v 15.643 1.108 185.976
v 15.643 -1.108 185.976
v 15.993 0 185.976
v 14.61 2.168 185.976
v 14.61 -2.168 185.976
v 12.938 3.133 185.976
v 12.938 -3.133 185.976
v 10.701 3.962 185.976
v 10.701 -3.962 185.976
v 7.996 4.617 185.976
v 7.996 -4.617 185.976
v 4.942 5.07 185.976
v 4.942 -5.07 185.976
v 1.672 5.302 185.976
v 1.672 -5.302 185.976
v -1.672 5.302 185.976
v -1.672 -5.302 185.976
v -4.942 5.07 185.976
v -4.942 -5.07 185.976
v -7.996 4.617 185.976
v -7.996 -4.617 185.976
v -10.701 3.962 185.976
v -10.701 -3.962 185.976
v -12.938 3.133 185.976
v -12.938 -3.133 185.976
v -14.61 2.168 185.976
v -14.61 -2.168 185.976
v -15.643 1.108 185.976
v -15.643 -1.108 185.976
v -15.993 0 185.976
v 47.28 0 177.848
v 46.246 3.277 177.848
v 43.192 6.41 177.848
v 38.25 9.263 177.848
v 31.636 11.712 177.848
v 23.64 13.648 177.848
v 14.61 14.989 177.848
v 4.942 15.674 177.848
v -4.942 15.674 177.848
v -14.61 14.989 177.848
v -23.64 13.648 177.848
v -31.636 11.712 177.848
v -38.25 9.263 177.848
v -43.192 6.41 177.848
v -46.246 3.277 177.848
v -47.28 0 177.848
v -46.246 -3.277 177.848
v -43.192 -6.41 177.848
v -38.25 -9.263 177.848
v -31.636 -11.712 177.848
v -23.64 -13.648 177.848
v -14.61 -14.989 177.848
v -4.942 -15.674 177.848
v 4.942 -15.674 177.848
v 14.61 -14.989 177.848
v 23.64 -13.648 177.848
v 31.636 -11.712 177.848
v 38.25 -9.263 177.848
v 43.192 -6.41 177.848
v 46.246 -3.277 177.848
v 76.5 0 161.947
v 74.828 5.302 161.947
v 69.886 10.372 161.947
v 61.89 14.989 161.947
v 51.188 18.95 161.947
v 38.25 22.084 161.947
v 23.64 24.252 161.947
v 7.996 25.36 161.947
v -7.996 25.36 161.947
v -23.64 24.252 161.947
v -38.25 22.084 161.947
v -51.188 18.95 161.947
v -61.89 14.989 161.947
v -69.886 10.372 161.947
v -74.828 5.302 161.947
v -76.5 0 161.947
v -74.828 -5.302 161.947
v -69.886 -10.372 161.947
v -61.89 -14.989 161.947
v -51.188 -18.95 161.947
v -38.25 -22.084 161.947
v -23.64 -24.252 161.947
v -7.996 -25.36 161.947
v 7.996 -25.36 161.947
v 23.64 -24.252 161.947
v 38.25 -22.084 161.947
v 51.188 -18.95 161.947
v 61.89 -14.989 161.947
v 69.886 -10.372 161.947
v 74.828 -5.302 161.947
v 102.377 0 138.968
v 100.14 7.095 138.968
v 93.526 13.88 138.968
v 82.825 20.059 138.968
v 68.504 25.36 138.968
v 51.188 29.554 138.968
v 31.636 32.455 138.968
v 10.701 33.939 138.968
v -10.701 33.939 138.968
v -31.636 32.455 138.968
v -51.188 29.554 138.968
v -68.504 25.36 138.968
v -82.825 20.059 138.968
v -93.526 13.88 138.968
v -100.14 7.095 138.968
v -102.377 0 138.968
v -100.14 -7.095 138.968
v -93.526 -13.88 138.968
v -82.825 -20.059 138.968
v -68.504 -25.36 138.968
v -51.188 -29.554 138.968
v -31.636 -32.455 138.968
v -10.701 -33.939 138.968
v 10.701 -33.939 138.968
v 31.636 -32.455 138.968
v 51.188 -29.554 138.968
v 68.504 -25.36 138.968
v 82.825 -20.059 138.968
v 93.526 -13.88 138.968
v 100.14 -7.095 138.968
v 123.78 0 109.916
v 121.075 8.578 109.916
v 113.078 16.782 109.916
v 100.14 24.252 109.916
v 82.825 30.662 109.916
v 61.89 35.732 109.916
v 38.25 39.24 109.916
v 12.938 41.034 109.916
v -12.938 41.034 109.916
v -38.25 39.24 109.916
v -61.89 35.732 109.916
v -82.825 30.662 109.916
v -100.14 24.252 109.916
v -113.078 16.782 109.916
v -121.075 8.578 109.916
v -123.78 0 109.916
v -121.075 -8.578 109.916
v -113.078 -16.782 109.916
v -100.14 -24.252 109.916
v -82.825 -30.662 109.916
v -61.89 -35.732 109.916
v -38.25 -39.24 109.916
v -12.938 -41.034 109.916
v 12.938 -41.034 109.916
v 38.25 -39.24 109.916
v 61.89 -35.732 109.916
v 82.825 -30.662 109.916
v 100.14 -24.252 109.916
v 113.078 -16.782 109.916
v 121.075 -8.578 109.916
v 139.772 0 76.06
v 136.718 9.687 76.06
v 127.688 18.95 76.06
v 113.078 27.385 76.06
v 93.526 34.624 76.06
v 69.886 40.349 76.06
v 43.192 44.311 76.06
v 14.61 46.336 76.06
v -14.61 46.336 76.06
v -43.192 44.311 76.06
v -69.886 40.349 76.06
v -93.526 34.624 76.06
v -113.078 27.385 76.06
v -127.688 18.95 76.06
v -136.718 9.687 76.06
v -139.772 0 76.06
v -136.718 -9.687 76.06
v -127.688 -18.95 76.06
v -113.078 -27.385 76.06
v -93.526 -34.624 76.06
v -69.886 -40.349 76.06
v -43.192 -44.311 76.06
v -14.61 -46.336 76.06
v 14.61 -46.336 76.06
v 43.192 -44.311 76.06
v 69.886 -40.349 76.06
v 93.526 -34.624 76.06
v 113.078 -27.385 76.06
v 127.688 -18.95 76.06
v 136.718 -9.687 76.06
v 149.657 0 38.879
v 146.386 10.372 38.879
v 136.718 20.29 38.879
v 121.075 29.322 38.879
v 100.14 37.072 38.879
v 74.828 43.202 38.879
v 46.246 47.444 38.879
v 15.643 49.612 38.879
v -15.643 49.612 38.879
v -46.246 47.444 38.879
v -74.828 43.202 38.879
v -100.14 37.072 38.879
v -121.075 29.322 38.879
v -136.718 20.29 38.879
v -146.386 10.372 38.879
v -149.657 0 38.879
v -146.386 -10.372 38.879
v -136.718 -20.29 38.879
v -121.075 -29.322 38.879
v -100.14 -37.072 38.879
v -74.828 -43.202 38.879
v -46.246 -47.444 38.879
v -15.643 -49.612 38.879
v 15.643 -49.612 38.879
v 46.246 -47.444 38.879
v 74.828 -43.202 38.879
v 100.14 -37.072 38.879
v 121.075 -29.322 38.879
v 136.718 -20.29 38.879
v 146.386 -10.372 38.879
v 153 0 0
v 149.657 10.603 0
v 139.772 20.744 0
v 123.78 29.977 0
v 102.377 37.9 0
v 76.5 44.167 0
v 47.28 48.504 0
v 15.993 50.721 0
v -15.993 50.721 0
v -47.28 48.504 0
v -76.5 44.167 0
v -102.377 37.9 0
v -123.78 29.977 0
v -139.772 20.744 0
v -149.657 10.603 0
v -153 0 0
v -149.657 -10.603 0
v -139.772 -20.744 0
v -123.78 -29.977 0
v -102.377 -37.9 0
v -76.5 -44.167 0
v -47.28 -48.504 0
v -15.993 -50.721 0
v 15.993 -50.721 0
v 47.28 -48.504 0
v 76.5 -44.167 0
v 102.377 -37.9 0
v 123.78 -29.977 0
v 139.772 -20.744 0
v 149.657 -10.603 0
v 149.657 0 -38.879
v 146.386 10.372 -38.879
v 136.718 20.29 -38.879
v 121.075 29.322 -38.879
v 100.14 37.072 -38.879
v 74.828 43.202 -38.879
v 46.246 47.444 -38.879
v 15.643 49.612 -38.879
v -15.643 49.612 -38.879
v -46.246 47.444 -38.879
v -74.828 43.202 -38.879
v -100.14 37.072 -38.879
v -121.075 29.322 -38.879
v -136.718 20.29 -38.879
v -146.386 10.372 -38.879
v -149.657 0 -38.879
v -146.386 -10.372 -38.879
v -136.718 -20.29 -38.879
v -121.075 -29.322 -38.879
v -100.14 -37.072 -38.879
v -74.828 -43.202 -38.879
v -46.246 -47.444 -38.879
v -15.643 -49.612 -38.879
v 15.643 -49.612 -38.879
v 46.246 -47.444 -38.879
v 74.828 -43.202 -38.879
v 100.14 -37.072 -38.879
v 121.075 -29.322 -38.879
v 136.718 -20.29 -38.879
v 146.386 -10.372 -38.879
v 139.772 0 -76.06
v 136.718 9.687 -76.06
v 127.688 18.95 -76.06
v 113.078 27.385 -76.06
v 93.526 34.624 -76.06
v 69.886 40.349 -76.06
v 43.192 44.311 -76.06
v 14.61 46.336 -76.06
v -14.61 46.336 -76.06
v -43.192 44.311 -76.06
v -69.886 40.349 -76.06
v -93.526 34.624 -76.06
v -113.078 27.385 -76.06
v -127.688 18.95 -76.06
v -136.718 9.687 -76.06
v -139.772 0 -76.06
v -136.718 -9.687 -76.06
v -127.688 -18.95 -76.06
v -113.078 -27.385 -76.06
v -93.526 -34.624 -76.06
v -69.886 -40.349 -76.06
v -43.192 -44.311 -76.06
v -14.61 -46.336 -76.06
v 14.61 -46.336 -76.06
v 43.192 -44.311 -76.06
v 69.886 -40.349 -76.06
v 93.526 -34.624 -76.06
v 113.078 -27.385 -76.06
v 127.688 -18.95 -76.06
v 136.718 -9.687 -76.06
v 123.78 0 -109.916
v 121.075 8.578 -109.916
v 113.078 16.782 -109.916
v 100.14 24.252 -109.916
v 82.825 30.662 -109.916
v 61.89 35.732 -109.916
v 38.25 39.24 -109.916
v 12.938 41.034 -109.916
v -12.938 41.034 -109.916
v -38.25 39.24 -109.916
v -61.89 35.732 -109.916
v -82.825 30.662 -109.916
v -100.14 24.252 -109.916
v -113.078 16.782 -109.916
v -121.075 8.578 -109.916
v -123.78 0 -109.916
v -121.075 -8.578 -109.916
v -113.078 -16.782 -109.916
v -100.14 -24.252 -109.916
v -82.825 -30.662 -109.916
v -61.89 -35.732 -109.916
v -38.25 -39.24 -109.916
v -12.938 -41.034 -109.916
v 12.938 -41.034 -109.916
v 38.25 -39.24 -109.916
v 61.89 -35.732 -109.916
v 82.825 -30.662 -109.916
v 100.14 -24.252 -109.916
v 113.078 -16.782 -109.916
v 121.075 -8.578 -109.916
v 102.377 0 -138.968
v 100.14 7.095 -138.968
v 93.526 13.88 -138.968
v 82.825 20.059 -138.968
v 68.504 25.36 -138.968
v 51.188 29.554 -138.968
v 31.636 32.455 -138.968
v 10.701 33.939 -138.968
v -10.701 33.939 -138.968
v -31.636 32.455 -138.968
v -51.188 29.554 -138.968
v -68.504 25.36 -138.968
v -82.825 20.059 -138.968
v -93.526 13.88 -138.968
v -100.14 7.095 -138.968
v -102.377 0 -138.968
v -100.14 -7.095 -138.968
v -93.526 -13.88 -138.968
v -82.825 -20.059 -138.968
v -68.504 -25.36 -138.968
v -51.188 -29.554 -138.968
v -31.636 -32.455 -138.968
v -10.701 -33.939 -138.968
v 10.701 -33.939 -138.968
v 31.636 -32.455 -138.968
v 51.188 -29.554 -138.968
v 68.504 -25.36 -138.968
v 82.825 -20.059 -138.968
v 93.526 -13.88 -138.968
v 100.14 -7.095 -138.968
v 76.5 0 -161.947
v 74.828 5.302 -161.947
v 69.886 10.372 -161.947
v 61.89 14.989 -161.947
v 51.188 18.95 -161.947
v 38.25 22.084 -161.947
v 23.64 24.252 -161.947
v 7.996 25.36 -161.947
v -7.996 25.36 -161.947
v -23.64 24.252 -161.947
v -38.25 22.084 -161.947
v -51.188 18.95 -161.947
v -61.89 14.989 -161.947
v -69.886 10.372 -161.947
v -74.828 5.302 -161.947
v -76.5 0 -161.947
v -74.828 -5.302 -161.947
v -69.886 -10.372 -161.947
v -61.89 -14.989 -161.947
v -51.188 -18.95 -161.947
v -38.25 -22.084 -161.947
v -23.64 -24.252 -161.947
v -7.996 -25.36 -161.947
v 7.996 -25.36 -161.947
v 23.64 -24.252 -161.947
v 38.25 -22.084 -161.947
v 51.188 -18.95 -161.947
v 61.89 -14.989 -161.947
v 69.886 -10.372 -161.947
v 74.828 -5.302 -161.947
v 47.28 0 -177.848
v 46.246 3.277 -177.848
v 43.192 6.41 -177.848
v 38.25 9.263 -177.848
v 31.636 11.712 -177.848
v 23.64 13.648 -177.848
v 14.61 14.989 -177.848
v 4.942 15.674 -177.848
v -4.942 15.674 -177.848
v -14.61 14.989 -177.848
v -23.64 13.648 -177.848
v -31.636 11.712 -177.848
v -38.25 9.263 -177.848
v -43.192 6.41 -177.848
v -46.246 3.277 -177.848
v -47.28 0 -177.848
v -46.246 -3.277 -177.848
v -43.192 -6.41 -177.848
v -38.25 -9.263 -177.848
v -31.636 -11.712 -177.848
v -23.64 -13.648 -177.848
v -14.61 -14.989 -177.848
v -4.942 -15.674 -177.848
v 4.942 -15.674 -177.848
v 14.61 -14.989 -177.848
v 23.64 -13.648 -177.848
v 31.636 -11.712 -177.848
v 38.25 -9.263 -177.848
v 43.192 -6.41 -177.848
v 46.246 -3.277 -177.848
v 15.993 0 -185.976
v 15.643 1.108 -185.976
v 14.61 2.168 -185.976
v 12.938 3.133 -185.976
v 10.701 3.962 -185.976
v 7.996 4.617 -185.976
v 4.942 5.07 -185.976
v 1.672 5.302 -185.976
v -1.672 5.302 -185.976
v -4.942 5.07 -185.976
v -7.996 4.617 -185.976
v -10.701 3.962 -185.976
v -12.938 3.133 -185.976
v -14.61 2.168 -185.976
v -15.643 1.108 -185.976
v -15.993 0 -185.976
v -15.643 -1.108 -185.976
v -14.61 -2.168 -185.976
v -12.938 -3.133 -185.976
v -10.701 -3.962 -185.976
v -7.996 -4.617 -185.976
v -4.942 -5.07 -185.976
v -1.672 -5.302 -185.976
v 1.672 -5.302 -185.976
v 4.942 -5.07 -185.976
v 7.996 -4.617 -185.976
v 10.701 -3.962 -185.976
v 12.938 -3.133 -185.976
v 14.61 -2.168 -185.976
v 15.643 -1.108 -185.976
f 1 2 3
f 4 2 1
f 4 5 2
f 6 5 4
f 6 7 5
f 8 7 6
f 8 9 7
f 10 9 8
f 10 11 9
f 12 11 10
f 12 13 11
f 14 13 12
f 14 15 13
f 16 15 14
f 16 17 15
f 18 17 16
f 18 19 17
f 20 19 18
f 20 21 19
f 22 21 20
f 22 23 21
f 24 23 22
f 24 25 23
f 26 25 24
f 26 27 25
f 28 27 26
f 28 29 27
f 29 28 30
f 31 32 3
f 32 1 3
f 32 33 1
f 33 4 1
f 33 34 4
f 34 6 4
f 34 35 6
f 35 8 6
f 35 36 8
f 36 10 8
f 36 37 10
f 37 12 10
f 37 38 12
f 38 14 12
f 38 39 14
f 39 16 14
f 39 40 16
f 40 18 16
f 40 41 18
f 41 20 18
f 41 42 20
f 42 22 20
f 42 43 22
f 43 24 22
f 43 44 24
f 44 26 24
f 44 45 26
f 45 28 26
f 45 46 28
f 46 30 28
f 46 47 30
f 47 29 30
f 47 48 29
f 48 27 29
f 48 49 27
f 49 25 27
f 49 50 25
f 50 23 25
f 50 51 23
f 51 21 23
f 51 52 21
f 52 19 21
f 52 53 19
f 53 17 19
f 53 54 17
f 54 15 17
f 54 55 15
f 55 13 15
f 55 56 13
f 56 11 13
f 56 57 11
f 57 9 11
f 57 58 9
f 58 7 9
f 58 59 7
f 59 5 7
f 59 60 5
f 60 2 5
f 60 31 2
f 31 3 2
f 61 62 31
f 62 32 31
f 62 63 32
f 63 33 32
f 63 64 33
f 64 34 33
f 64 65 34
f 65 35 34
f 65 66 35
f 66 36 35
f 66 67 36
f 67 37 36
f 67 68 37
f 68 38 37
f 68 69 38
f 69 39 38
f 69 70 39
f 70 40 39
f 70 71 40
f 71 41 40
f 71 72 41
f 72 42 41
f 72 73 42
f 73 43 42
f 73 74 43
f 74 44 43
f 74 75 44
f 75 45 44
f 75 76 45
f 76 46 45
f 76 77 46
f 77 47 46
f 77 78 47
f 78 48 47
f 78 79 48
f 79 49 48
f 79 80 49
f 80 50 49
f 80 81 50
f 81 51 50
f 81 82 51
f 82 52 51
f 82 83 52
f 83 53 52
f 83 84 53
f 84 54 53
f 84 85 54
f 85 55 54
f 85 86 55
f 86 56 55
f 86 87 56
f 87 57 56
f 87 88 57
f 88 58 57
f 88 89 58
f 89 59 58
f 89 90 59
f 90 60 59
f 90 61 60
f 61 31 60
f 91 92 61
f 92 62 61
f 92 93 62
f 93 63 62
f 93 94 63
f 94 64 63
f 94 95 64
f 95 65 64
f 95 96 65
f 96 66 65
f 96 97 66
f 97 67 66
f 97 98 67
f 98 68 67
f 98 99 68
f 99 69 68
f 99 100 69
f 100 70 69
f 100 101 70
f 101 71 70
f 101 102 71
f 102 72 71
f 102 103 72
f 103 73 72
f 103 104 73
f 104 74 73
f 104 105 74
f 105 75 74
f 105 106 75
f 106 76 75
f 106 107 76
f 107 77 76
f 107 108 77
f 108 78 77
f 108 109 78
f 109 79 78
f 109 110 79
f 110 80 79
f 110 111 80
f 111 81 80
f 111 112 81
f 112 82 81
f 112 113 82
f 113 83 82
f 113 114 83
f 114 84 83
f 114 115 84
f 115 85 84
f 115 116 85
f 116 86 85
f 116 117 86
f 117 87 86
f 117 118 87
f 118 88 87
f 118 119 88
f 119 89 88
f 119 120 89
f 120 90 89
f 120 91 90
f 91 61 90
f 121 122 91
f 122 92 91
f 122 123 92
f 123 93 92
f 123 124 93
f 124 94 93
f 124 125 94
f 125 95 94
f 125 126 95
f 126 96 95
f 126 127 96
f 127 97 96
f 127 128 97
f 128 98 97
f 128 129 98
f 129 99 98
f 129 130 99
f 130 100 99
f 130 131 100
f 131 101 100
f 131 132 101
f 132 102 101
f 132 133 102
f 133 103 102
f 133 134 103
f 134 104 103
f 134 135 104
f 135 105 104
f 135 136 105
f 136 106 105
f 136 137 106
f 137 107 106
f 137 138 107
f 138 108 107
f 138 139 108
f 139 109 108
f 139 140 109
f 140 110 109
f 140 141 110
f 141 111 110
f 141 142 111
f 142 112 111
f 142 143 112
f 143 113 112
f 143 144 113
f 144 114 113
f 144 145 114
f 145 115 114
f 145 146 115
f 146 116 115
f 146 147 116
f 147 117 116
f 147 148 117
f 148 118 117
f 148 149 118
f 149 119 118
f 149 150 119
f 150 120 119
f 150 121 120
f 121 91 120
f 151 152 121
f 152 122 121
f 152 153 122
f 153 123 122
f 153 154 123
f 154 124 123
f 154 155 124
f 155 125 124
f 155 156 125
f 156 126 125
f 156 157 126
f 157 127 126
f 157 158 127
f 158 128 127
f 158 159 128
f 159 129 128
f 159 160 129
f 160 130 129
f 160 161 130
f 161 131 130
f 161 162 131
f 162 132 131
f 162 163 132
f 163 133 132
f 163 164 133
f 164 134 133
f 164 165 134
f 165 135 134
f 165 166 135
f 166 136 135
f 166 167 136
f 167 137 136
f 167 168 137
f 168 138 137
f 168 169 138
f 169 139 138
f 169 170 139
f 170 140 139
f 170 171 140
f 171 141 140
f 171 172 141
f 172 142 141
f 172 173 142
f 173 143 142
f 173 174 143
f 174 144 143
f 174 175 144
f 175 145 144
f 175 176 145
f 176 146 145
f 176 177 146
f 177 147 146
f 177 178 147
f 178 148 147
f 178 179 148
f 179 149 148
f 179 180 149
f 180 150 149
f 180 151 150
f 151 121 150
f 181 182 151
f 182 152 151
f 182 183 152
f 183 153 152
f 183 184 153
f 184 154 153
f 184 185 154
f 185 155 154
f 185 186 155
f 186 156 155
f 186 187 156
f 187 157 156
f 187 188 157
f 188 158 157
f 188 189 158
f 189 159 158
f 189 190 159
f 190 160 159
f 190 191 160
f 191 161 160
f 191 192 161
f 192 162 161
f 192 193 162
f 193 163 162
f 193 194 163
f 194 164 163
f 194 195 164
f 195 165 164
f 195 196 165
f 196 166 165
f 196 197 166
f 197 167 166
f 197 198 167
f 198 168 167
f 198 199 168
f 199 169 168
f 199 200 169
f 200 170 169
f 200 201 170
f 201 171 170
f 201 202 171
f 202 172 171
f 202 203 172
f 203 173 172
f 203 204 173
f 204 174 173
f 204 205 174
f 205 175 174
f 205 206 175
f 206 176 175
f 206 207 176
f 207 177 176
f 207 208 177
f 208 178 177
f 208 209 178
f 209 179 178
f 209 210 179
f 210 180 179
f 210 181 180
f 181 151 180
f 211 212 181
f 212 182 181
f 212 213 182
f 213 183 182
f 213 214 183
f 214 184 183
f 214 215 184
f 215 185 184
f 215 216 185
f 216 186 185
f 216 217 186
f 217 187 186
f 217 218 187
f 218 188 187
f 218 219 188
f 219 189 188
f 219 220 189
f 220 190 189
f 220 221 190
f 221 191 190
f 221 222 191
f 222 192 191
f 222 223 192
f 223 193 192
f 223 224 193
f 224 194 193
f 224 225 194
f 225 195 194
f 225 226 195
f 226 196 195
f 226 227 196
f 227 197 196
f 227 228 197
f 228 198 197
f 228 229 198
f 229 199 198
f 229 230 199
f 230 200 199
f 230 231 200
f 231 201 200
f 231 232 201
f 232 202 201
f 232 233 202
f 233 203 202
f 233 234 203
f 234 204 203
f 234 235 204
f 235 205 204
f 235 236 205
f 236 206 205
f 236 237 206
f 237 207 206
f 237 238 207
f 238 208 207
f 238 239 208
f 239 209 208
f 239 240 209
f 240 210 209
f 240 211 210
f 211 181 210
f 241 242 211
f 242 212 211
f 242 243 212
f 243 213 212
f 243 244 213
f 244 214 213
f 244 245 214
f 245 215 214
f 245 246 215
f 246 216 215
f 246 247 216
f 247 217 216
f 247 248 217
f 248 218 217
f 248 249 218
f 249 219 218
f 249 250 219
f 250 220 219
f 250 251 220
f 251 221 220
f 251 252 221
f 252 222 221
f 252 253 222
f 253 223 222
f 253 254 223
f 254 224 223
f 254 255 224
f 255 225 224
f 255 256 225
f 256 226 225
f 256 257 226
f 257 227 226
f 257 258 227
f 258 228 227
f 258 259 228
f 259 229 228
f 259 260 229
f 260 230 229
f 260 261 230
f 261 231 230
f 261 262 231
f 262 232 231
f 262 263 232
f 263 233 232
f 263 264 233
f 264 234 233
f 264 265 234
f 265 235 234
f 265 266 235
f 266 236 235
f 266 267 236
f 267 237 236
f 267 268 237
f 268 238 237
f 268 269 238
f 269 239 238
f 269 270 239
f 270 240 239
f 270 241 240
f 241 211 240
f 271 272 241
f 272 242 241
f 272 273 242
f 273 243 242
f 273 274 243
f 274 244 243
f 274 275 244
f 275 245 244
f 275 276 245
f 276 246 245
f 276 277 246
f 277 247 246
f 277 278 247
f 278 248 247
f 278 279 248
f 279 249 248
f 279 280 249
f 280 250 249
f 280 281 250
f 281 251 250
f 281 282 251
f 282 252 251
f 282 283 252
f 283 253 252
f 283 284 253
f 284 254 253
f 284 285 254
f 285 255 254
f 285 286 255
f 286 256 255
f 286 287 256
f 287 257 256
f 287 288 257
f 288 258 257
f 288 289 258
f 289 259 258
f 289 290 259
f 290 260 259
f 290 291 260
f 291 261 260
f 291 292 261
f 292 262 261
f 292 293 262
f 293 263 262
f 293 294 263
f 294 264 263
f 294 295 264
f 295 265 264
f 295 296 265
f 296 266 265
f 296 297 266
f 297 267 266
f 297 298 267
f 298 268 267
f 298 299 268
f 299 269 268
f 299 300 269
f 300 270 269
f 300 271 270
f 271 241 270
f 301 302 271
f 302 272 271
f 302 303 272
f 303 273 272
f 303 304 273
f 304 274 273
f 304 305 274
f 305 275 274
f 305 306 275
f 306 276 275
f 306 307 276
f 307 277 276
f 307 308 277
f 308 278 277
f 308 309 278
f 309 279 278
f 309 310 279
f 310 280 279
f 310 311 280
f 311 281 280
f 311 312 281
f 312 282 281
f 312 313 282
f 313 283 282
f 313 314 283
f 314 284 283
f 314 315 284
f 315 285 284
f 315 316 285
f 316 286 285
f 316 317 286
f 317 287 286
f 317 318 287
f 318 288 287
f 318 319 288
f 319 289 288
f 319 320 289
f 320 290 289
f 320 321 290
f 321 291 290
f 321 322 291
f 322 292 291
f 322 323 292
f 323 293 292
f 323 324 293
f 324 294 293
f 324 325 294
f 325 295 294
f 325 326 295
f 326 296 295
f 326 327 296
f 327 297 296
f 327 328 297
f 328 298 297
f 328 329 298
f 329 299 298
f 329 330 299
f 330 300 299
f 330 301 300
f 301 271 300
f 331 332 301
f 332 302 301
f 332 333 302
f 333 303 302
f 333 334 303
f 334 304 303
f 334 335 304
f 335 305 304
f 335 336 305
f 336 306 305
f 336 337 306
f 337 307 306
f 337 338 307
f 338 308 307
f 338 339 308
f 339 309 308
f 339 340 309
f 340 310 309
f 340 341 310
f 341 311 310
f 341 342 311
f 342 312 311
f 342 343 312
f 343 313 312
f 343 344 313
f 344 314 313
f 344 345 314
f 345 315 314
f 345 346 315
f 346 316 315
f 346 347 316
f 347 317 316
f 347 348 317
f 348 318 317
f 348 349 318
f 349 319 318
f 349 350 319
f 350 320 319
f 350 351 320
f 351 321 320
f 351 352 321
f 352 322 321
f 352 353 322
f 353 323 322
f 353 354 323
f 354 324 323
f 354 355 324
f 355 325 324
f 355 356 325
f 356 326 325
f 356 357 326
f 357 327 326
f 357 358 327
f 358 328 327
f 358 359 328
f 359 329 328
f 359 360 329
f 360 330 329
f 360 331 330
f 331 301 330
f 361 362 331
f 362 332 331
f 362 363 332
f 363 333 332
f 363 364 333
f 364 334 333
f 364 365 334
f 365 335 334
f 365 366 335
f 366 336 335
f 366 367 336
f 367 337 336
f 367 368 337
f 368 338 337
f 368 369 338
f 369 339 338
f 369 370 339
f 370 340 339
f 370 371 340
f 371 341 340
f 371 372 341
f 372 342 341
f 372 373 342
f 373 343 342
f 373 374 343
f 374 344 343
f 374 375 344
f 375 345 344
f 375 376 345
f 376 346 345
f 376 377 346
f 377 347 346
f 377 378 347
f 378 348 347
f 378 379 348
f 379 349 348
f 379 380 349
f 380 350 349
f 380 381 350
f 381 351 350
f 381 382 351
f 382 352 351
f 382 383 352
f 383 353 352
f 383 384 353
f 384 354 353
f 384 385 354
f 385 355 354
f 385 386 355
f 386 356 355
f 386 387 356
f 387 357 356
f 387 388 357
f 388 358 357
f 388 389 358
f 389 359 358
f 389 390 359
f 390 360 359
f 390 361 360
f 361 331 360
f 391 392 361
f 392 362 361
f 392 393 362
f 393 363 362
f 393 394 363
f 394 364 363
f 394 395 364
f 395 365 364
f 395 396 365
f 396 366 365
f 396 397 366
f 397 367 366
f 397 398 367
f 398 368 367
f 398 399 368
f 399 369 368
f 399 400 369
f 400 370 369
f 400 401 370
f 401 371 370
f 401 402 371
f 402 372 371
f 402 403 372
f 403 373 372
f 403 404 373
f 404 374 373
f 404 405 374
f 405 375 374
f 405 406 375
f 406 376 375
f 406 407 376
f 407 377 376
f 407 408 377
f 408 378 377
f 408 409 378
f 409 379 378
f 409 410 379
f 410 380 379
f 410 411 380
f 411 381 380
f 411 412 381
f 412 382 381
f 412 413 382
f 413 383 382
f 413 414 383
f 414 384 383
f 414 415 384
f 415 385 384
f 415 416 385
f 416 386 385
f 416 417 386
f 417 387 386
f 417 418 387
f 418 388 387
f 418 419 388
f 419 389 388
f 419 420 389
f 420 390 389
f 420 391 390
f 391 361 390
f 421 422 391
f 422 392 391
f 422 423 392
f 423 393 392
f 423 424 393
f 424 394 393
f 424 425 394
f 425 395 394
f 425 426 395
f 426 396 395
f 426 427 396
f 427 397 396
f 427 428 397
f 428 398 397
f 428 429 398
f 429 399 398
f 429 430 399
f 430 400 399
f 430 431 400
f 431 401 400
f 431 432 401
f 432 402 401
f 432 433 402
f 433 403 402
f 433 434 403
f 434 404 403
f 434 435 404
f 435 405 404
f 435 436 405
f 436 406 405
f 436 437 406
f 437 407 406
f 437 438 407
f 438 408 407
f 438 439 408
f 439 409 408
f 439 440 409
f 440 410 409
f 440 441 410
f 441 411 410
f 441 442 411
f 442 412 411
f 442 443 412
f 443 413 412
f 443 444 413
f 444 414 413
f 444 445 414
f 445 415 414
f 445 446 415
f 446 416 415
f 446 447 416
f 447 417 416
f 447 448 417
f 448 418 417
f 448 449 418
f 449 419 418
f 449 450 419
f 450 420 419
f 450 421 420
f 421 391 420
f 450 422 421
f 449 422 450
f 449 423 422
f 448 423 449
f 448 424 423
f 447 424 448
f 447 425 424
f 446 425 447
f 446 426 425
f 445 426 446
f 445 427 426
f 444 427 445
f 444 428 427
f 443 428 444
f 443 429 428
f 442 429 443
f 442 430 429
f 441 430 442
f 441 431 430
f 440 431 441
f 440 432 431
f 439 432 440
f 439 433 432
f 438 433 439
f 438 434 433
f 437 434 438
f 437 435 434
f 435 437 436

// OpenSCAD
// Generated by SolidPython 1.0.1 on 2020-07-29 00:46:48


scale(v = [9, 3, 11]) {
	sphere(r = 17);
}
/***********************************************
*********      SolidPython code:      **********
************************************************
 
# import packages: SolidPython
from solid import *
from solid.utils import *
from itertools import chain, combinations, permutations


class Resize:

    def __init__(self, scad_file):
        self.scad_file = scad_file
        #self.scad_file = import_scad(scad_file)
        # cone/cylinder param:
        self.r1 = 0
        self.r2 = 0
        self.h = 0
        # rectangular prism param:
        self.w = 0
        self.l = 0
        # ellipse param:
        self.r = 0

    # import OpenScad code (file name corresponds to shape)


    # classify shape + parameters
    def assign(self, param1, param2, param3):
        if self.scad_file == 'cone.scad':
            self.r1 = param1
            self.r2 = param2
            self.h = param3
        elif self.scad_file == 'cylinder.scad':
            self.r1 = param1
            self.r2 = param2
            self.h = param3
        elif self.scad_file == 'rectangularPrism.scad':
            self.h = param1
            self.l = param2
            self.w = param3
        else:
            self.r = param1
            self.h = param2

    # resize parameters
    def iterate(self):
        x = range(3, 20, 2)
        i = 1
        if self.scad_file == 'cone.scad':
            tempList = list(permutations(x, 2))
            for temp in tempList:
                param1 = temp[0]
                param2 = temp[1]
                filepath = 'produced_scad_files/' + 'cone' + str(param1) + '_' + str(param2) + '_' + '.scad'
                scad_render_to_file(cylinder(h=param1, r1=param2, r2=0), filepath)

        elif self.scad_file == 'cylinder.scad':
            tempList = list(permutations(x, 3))
            for temp in tempList:
                param1 = temp[0]
                param2 = temp[1]
                filepath = 'produced_scad_files/' + 'cylinder' + str(param1) + '_' + str(param2) + '_' + '.scad'
                scad_render_to_file(cylinder(h=param1, r1=param2, r2=param2), filepath)

        elif self.scad_file == 'rectangularPrism.scad':
            tempList = list(permutations(x, 3))
            for temp in tempList:
                param1 = temp[0]
                param2 = temp[1]
                param3 = temp[2]
                filepath = 'produced_scad_files/' + 'rectangularPrism' + str(param1) + '_' + str(param2) + '_' + str(
                    param3) + '.scad'
                scad_render_to_file(cube(size=(param1, param2, param3)), filepath)

        elif self.scad_file == 'ellipse.scad':
            tempList = list(permutations(x, 4))
            for temp in tempList:
                param1 = temp[0]
                param2 = temp[1]
                param3 = temp[2]
                param4 = temp[3]
                filepath = 'produced_scad_files/' + 'ellipse' + str(param1) + '_' + str(param2) + '_' + str(param3) + '_' + str(param4) + '.scad'
                scad_render_to_file(scale([param1, param2, param3])(sphere(r=param4)), filepath)

    def render_to_scadfile(self):
        scad_render_to_file(scad, 'example.scad') 
 
************************************************/
